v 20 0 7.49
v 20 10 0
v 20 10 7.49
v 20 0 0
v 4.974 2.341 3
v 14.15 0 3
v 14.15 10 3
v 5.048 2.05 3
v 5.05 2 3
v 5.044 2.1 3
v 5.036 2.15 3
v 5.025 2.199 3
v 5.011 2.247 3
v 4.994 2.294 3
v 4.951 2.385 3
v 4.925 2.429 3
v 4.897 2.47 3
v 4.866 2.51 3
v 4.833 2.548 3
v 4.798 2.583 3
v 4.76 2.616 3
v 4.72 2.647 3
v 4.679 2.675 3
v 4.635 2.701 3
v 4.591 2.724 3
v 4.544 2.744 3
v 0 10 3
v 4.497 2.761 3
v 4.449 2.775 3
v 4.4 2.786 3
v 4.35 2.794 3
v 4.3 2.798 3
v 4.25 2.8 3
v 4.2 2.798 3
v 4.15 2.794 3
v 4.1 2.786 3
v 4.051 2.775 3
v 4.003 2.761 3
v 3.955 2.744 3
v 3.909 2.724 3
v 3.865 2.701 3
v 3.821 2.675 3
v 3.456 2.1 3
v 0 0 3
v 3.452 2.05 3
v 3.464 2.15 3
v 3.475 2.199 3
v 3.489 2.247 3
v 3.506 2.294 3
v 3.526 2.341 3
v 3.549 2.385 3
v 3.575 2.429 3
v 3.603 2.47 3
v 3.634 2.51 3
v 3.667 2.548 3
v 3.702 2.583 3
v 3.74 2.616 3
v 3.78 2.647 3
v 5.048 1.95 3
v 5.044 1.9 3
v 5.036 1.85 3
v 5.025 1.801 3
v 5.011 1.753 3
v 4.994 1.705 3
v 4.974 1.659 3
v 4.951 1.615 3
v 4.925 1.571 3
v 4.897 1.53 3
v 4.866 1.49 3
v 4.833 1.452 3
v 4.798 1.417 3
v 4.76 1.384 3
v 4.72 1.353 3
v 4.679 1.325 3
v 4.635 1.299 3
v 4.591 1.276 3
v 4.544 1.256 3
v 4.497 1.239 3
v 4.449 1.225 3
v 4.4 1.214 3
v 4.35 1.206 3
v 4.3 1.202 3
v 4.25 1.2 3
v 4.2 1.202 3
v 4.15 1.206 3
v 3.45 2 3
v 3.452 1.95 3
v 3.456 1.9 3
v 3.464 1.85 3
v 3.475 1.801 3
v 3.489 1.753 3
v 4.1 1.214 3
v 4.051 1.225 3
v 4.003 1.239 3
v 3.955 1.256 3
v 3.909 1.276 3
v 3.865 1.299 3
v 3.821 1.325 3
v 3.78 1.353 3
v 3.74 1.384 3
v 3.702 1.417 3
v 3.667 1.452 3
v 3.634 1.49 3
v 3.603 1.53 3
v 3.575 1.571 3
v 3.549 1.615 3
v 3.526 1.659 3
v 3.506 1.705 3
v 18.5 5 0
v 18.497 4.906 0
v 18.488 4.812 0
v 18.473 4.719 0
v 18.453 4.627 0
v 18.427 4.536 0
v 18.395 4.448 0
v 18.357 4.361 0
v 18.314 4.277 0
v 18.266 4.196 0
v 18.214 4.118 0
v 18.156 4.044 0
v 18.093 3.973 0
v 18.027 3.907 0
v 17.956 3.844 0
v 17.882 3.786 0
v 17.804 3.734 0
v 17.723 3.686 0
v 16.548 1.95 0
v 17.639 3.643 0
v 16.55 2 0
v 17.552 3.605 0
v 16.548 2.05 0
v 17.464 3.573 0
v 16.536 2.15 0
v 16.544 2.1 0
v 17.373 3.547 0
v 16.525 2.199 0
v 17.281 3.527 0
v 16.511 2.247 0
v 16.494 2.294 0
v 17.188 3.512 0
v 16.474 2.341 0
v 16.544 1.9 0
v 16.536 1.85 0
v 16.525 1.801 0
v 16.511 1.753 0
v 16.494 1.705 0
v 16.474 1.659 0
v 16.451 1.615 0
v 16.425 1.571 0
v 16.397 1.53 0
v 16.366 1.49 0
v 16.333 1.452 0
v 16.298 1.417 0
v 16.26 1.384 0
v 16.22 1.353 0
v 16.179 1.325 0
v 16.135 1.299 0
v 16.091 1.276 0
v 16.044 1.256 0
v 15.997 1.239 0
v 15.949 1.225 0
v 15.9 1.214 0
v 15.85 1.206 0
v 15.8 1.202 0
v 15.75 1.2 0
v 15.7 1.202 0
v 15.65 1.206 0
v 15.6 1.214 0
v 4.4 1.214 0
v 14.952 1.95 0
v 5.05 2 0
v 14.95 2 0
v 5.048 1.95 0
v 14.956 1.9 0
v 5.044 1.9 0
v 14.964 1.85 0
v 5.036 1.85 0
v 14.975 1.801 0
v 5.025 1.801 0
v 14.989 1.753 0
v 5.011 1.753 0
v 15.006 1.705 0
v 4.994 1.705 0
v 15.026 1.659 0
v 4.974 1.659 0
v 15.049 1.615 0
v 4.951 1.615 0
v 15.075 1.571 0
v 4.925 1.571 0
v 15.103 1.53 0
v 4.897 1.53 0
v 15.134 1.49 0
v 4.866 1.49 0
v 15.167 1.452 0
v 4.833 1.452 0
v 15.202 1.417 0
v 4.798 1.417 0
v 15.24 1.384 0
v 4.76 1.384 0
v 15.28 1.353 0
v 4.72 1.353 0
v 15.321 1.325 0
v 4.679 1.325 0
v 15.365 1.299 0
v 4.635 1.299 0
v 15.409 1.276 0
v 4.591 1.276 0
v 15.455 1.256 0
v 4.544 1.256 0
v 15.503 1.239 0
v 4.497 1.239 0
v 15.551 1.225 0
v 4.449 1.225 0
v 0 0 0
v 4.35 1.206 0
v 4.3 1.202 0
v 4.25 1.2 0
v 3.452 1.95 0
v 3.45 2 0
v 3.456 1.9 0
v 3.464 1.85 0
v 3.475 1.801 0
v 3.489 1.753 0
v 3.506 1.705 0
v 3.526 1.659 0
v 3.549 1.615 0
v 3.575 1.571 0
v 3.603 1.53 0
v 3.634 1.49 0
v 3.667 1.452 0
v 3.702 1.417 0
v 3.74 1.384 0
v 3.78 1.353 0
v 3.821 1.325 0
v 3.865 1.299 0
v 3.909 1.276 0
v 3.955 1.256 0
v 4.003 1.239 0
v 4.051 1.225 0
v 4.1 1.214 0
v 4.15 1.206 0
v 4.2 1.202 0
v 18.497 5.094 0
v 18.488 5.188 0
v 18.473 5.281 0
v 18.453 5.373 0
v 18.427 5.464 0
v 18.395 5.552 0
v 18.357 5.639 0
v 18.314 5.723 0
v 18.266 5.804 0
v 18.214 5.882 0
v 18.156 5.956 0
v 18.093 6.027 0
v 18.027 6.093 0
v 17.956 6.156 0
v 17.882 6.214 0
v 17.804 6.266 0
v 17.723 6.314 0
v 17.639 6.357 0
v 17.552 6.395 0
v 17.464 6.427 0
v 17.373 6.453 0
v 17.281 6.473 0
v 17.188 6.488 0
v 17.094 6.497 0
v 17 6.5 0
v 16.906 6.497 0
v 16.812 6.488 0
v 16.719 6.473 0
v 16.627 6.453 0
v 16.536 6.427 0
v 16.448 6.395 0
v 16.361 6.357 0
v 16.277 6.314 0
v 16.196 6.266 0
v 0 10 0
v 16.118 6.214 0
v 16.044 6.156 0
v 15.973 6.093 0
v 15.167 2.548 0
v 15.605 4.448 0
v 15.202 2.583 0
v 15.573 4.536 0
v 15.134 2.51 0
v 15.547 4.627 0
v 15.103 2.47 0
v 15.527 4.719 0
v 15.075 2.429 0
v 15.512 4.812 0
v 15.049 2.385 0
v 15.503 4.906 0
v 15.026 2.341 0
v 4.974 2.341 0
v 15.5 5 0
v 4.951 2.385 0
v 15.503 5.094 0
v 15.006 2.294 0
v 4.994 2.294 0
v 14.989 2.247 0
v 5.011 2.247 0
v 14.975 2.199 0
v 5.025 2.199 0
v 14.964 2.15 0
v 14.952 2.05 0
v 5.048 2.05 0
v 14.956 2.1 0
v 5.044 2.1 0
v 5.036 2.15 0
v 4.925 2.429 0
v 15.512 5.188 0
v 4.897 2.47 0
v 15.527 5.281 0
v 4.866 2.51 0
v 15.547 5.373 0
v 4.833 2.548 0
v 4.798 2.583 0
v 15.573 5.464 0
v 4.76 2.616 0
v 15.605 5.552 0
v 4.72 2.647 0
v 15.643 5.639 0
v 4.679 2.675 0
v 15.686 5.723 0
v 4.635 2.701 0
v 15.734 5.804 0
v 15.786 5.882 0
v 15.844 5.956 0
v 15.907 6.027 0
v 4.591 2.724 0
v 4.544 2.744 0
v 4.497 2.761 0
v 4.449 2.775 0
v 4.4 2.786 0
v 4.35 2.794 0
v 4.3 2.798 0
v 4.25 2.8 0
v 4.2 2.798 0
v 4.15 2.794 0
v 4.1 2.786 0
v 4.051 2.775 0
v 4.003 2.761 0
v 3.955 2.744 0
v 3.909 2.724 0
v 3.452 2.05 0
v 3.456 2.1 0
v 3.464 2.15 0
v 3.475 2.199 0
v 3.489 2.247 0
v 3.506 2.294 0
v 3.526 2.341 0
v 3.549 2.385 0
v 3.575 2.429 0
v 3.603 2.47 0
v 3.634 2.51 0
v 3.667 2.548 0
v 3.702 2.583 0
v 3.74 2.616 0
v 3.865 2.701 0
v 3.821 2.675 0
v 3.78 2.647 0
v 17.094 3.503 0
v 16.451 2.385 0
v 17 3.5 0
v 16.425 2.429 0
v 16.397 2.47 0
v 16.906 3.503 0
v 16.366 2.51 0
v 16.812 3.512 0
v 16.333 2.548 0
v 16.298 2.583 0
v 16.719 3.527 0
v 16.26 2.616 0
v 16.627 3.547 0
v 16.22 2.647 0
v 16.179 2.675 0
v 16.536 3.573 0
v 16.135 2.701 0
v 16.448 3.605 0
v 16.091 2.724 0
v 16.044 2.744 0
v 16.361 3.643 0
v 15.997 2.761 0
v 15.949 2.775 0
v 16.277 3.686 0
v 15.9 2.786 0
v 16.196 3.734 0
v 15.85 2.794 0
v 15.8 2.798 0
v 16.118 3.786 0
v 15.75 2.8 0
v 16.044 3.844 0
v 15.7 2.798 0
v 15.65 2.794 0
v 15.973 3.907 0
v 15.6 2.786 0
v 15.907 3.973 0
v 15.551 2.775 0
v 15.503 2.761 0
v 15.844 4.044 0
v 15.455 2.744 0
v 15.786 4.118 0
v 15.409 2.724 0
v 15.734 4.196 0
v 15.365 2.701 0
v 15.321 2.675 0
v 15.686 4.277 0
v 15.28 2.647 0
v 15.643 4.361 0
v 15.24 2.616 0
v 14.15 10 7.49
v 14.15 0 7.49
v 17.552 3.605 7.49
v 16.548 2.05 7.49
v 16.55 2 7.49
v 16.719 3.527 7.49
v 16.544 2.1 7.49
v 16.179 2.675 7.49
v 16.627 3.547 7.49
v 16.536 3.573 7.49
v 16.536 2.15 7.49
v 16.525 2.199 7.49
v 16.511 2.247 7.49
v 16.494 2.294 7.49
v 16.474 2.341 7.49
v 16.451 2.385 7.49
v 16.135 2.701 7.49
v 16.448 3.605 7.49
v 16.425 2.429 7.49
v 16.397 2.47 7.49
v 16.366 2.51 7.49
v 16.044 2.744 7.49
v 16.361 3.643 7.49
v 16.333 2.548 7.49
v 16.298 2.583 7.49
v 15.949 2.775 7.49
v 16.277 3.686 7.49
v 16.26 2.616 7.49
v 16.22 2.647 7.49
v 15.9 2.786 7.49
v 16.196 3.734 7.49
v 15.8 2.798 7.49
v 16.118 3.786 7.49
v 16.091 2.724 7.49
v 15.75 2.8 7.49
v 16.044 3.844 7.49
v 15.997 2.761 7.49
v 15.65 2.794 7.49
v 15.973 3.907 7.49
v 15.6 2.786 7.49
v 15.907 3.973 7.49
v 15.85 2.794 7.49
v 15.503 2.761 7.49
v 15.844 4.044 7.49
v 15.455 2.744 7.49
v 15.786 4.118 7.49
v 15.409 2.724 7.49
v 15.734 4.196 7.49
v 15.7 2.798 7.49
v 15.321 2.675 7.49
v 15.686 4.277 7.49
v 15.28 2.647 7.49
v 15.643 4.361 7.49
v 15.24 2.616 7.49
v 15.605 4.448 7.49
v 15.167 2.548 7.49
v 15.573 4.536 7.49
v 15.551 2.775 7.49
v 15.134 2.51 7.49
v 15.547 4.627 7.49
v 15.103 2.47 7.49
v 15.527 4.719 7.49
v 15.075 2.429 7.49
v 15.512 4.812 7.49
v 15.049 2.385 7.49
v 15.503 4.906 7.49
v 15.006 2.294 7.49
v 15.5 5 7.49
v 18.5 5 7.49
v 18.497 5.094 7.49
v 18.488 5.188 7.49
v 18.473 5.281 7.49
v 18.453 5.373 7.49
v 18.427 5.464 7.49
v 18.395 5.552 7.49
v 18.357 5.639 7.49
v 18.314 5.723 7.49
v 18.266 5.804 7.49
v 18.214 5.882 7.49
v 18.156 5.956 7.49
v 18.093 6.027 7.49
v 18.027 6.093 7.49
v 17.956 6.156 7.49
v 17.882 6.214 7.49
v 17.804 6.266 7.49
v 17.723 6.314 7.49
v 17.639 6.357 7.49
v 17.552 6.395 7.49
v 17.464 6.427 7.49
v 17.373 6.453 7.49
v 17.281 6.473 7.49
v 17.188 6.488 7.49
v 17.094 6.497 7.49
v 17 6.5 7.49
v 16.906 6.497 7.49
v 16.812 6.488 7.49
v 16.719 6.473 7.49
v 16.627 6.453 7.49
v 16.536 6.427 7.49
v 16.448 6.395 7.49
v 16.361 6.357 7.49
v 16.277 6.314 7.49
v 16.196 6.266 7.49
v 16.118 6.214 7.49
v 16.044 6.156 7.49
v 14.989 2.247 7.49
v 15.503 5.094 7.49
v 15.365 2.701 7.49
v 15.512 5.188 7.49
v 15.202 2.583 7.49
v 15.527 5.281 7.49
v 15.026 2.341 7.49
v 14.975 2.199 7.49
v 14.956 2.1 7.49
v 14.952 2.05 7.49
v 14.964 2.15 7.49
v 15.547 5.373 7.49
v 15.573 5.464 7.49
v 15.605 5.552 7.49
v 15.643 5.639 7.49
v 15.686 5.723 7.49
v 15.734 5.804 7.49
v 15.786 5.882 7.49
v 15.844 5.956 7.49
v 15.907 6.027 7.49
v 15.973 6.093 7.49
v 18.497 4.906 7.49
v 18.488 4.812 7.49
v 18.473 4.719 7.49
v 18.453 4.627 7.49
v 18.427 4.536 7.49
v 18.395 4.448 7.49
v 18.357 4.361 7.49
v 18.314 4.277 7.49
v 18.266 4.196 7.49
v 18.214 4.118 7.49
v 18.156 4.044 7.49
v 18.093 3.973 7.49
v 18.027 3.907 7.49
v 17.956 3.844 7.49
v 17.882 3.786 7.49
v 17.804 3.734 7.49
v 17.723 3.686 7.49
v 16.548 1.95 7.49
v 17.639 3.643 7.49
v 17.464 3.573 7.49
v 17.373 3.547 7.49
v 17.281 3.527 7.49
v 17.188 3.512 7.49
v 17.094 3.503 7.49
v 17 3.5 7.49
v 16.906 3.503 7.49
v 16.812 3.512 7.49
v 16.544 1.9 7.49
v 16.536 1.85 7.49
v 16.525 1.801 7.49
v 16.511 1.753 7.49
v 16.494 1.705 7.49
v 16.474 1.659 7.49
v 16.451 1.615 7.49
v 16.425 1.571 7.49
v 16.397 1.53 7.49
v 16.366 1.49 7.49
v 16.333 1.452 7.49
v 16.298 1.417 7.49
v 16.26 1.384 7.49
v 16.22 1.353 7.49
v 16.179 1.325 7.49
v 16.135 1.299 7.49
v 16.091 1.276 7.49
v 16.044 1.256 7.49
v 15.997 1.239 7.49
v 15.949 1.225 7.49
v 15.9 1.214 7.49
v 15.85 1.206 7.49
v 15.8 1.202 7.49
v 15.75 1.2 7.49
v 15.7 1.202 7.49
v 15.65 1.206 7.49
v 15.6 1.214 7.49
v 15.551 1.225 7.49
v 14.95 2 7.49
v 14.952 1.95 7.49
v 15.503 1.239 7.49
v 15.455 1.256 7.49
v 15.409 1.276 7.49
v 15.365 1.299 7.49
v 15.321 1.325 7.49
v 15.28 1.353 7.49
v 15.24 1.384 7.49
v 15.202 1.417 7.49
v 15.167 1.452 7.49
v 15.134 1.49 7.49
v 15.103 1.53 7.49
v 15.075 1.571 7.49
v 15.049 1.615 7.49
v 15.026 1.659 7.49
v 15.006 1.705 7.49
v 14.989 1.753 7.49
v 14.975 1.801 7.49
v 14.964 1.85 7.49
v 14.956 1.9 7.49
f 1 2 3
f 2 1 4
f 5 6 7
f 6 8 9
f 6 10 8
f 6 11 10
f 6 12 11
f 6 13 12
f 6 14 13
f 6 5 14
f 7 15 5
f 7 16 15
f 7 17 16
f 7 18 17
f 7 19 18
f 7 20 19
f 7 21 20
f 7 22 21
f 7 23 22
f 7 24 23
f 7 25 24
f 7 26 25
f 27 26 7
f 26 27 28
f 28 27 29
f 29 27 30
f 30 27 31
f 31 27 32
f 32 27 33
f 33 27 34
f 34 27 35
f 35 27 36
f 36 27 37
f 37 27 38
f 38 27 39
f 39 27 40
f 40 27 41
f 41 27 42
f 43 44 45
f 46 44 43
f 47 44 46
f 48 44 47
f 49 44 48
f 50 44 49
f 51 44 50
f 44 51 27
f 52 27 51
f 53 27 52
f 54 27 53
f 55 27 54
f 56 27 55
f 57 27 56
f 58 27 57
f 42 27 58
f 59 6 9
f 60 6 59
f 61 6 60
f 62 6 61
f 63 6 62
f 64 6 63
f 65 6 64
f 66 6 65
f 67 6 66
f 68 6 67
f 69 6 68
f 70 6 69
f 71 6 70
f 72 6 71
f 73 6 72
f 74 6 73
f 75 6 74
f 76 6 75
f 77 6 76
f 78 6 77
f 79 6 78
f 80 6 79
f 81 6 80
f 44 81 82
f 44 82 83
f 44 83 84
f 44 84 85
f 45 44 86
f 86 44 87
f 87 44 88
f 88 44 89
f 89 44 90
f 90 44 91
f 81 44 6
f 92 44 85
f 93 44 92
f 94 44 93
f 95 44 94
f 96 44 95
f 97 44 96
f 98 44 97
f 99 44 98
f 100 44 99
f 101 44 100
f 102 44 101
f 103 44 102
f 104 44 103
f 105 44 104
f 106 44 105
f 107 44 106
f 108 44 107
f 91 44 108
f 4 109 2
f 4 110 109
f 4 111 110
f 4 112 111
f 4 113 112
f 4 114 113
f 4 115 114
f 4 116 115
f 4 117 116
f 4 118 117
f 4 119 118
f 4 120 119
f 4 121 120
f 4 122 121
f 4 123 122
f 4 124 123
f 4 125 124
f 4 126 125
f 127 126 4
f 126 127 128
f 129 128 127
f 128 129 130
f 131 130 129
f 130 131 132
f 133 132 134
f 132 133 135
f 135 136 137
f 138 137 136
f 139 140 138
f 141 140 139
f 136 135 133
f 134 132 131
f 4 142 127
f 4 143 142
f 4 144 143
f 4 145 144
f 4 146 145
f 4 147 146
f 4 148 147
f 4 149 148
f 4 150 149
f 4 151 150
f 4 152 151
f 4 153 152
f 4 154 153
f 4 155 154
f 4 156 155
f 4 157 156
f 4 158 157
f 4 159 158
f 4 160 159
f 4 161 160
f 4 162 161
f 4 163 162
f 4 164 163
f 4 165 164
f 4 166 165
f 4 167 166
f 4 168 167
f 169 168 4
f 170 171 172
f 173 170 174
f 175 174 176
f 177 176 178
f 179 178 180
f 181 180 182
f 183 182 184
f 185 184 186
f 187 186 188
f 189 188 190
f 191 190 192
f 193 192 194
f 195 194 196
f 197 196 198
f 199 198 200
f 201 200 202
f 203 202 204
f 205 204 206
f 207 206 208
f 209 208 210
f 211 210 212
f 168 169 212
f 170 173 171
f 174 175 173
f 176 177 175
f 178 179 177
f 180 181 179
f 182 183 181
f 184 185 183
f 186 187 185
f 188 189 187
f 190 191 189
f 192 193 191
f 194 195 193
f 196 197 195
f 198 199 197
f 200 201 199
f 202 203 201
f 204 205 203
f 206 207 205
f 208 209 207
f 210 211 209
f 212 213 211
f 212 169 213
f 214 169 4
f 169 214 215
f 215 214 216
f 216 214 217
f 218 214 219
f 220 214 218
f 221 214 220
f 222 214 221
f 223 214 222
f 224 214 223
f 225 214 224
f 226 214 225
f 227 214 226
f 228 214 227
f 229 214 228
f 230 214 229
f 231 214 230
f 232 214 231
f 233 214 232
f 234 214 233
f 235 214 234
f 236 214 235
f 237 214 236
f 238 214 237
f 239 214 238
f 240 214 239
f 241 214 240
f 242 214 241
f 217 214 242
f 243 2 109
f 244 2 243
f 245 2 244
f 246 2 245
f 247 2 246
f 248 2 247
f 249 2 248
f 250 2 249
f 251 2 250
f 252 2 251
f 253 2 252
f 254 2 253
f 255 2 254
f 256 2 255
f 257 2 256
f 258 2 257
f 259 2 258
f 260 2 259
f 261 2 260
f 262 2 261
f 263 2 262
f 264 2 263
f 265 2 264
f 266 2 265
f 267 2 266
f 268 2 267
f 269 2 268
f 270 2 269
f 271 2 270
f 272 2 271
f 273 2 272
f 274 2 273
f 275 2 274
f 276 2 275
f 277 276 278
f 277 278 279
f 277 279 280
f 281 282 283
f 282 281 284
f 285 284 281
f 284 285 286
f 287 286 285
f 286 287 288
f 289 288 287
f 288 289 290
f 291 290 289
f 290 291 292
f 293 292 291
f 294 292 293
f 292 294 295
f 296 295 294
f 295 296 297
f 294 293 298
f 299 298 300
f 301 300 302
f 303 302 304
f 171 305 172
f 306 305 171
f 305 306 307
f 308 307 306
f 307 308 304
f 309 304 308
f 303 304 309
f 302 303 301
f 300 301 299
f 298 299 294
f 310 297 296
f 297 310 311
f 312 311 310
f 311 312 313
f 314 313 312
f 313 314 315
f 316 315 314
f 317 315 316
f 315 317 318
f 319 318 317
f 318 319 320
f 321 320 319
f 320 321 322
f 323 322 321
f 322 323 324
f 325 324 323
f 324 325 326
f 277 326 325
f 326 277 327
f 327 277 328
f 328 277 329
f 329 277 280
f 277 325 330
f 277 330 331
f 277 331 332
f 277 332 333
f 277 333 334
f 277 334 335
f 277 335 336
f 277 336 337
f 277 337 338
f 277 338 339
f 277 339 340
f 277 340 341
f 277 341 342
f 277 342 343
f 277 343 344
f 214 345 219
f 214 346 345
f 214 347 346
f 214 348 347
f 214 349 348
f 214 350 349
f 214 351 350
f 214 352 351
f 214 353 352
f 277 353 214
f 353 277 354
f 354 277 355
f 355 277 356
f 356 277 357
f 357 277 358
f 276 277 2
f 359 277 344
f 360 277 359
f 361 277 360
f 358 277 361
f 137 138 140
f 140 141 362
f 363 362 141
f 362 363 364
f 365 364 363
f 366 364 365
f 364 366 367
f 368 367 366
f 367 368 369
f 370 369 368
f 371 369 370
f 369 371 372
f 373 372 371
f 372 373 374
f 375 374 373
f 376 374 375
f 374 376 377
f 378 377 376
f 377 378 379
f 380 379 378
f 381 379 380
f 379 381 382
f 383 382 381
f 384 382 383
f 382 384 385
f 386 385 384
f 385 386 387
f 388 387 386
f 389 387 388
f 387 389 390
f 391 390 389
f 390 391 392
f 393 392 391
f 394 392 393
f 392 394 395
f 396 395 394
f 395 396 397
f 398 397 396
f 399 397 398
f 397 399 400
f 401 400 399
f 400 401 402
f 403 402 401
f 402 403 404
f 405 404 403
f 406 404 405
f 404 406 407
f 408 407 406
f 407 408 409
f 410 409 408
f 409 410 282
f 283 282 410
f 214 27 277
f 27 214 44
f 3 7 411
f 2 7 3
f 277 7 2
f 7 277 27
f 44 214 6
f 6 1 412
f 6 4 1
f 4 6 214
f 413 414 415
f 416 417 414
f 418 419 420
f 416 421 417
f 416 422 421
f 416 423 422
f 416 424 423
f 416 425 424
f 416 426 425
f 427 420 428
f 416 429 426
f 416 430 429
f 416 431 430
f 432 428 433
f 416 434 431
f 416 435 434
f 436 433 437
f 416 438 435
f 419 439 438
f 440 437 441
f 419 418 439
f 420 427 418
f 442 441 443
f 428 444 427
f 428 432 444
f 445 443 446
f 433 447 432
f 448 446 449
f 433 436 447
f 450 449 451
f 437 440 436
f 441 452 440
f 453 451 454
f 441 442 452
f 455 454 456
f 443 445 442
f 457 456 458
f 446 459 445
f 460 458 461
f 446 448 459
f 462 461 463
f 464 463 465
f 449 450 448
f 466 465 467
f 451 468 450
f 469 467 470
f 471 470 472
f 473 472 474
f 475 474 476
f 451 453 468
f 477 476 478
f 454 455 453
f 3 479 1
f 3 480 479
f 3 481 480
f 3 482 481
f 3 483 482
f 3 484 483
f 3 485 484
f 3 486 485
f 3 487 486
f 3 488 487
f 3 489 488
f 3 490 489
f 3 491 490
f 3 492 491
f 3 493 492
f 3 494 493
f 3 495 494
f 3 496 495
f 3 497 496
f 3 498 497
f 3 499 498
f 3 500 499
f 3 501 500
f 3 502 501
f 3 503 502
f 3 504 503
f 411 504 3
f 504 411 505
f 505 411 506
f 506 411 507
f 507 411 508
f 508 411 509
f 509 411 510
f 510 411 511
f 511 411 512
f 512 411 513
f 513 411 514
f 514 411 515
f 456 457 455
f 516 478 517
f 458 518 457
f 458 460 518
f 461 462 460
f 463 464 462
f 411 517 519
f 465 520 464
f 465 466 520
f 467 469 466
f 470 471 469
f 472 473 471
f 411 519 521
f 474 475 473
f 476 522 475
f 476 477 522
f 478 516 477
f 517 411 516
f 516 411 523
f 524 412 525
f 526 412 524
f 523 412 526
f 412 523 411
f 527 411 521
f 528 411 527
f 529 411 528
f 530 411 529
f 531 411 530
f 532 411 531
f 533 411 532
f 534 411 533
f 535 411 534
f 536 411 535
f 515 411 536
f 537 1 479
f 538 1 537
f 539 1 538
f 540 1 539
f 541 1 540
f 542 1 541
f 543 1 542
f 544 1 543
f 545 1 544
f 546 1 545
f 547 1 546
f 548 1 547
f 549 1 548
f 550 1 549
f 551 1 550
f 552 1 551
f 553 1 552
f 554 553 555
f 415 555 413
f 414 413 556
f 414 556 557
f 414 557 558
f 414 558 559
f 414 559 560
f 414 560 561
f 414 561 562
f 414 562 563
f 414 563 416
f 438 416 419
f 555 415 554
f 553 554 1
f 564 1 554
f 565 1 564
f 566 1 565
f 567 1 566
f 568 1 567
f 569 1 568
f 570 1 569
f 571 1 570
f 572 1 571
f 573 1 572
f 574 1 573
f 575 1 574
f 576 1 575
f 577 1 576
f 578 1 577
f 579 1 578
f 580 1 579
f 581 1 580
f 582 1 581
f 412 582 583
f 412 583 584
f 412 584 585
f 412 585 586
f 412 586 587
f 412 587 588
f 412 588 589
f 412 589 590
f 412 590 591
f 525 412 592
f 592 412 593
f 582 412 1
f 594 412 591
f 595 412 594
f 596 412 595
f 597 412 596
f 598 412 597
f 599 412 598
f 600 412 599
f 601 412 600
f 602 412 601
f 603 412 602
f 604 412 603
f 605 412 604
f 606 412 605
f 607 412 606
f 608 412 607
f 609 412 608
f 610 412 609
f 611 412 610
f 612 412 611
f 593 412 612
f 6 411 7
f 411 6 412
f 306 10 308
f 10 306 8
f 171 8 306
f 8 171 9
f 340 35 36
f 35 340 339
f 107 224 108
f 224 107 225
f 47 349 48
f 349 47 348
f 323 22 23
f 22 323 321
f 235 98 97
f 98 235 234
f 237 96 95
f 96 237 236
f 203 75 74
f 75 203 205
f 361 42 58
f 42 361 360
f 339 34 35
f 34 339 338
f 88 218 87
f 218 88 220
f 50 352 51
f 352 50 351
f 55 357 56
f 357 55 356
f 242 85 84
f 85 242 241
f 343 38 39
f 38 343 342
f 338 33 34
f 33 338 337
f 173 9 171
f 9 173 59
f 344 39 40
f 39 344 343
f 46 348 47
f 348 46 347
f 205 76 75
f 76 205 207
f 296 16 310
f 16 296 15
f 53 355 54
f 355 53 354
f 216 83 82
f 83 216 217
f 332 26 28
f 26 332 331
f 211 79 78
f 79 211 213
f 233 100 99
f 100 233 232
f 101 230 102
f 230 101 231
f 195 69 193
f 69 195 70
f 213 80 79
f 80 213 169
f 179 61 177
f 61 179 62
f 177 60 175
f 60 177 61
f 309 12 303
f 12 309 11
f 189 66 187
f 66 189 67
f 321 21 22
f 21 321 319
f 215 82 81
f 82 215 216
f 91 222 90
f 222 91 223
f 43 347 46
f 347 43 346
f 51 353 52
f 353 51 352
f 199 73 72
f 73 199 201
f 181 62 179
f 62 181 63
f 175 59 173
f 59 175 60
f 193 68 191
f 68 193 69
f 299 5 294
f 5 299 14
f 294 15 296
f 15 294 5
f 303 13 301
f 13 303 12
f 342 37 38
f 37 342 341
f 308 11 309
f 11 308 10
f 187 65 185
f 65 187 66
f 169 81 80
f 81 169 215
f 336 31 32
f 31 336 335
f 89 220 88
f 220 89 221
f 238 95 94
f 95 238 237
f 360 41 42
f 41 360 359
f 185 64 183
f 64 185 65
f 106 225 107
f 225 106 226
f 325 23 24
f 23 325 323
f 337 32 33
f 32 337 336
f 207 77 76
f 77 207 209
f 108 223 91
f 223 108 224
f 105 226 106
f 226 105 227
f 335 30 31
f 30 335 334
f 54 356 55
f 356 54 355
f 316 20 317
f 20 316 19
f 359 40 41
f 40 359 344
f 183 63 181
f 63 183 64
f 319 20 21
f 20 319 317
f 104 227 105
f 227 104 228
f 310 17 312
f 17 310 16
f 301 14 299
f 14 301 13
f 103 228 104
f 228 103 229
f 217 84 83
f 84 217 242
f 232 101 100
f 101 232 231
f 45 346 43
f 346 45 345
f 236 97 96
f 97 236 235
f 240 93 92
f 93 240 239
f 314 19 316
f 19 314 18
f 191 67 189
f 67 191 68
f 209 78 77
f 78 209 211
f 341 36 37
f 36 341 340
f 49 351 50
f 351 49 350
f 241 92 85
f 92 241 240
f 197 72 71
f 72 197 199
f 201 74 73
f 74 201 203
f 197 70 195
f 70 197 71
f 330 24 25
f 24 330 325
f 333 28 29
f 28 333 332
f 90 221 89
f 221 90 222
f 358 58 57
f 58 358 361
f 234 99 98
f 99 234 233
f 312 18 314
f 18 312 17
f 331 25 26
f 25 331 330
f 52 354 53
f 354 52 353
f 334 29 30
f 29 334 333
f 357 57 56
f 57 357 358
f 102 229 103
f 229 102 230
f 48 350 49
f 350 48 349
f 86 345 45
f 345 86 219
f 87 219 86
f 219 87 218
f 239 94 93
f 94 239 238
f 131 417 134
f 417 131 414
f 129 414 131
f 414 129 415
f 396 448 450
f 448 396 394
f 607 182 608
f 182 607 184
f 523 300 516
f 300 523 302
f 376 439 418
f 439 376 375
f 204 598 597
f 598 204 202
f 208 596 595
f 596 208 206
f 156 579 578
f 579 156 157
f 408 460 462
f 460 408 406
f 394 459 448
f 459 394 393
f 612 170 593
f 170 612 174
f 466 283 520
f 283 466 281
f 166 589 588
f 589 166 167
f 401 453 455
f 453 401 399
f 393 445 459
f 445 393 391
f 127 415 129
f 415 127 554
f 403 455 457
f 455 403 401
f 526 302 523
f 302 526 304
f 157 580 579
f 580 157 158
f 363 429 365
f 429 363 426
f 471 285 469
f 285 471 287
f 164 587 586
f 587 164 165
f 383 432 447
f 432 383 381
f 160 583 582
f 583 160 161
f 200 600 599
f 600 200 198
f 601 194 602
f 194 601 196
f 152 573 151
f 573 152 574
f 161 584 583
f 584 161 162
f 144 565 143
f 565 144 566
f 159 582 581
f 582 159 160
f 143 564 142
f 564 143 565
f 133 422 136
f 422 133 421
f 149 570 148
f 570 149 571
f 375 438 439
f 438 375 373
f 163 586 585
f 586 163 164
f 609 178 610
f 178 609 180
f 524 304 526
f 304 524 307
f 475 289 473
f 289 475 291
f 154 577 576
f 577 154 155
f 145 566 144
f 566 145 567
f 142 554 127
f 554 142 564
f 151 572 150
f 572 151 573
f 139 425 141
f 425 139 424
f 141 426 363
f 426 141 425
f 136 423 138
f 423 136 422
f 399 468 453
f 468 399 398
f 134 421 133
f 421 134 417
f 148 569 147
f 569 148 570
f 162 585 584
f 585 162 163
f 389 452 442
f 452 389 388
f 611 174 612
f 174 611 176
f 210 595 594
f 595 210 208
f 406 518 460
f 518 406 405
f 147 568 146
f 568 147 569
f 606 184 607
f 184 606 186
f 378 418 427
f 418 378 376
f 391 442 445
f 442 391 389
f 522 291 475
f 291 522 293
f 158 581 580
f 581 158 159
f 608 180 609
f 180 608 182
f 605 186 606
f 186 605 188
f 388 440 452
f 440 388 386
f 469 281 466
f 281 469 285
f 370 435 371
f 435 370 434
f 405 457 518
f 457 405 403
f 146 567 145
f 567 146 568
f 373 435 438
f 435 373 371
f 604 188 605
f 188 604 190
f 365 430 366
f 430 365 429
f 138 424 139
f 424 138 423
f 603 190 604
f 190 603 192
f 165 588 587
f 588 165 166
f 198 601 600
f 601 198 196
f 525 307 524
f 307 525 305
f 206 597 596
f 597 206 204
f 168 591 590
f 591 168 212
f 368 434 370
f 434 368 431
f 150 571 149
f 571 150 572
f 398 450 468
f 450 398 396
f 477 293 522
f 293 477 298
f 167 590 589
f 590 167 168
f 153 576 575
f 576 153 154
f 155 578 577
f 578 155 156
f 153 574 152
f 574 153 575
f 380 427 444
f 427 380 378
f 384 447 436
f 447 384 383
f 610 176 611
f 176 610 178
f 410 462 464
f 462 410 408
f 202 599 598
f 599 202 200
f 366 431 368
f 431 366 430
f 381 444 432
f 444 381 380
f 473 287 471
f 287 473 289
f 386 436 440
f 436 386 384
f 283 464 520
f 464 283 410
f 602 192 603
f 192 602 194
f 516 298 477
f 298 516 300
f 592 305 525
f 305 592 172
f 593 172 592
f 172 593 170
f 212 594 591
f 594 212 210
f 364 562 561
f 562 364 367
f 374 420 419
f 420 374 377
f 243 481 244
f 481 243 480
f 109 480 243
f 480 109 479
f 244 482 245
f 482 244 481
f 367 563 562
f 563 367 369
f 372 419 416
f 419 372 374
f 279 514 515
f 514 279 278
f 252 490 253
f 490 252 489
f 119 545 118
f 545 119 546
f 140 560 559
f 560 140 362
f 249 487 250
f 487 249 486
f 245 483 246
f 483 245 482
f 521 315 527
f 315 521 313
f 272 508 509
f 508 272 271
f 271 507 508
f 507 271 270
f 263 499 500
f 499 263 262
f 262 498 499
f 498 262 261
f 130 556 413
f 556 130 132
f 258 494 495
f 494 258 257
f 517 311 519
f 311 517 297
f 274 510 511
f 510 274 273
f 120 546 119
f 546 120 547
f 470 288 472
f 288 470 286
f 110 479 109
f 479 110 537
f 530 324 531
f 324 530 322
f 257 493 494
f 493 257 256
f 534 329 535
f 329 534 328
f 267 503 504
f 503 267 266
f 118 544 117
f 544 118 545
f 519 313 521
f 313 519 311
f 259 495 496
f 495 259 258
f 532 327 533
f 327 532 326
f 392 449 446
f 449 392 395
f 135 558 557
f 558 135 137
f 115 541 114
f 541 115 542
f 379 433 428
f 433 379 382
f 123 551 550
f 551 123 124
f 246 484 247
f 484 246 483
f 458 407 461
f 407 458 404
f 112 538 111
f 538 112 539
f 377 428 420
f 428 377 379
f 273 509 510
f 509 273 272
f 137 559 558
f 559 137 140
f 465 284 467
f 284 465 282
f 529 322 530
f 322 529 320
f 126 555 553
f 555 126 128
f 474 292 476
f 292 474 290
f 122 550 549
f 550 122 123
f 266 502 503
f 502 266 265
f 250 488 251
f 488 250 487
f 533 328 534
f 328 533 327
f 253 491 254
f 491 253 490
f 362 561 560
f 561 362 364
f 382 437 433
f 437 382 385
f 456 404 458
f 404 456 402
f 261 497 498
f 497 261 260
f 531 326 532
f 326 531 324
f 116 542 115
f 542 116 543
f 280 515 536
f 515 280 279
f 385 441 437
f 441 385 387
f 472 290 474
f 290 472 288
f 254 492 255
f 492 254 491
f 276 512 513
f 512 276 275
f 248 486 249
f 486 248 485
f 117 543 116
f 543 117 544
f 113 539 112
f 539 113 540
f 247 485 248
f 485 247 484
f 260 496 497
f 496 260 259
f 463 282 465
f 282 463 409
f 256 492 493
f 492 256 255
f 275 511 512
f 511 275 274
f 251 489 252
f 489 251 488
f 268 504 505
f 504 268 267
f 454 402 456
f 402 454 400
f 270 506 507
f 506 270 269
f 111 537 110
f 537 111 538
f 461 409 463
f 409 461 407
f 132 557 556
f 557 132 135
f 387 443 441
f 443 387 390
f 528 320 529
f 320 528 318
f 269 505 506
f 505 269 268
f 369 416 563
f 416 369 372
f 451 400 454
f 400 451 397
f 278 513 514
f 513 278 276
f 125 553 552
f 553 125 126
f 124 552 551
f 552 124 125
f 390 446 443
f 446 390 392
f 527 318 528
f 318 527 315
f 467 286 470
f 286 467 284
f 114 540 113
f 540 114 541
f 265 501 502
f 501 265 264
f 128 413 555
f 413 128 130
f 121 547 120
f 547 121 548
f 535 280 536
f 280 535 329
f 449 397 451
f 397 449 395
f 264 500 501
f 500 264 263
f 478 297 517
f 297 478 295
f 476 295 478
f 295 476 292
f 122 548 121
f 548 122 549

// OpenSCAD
// precision-related
eps = 0.01;
$fn = 100;

// these small heads are probably from pocket microcassette recorders

// mount height offset
// the head's bracket is Z shaped, with one side higher than the other
height_offset = 4.5;

// bracket hole diameter. Appears to be for M1.6
bracket_hole_dia = 1.6;

// the bracket has two holes
bracket_hole_spacing = 11.5;

// distance from the front of the head to the center line between the two holes
head_distance = 8;

difference() {
    base_thickness = 3;
    union() {
        // the base
        cube([20, 10, base_thickness]);
        // right support
        b = 20/2+bracket_hole_spacing/2-bracket_hole_dia;
        translate([b, 0, base_thickness-eps])
        cube([20-b, 10, height_offset]);
    }

    // left hole
    translate([20/2-bracket_hole_spacing/2, 10-8, 0])
    cylinder(8, d=bracket_hole_dia, center= true);

    // right hole
    translate([20/2+bracket_hole_spacing/2, 10-8, 0])
    cylinder(30, d=bracket_hole_dia, center= true);
    
    // generic mounting hole to attach this somewhere
    translate([17,5,-eps])
    cylinder(20, d=3, center=true);
}
